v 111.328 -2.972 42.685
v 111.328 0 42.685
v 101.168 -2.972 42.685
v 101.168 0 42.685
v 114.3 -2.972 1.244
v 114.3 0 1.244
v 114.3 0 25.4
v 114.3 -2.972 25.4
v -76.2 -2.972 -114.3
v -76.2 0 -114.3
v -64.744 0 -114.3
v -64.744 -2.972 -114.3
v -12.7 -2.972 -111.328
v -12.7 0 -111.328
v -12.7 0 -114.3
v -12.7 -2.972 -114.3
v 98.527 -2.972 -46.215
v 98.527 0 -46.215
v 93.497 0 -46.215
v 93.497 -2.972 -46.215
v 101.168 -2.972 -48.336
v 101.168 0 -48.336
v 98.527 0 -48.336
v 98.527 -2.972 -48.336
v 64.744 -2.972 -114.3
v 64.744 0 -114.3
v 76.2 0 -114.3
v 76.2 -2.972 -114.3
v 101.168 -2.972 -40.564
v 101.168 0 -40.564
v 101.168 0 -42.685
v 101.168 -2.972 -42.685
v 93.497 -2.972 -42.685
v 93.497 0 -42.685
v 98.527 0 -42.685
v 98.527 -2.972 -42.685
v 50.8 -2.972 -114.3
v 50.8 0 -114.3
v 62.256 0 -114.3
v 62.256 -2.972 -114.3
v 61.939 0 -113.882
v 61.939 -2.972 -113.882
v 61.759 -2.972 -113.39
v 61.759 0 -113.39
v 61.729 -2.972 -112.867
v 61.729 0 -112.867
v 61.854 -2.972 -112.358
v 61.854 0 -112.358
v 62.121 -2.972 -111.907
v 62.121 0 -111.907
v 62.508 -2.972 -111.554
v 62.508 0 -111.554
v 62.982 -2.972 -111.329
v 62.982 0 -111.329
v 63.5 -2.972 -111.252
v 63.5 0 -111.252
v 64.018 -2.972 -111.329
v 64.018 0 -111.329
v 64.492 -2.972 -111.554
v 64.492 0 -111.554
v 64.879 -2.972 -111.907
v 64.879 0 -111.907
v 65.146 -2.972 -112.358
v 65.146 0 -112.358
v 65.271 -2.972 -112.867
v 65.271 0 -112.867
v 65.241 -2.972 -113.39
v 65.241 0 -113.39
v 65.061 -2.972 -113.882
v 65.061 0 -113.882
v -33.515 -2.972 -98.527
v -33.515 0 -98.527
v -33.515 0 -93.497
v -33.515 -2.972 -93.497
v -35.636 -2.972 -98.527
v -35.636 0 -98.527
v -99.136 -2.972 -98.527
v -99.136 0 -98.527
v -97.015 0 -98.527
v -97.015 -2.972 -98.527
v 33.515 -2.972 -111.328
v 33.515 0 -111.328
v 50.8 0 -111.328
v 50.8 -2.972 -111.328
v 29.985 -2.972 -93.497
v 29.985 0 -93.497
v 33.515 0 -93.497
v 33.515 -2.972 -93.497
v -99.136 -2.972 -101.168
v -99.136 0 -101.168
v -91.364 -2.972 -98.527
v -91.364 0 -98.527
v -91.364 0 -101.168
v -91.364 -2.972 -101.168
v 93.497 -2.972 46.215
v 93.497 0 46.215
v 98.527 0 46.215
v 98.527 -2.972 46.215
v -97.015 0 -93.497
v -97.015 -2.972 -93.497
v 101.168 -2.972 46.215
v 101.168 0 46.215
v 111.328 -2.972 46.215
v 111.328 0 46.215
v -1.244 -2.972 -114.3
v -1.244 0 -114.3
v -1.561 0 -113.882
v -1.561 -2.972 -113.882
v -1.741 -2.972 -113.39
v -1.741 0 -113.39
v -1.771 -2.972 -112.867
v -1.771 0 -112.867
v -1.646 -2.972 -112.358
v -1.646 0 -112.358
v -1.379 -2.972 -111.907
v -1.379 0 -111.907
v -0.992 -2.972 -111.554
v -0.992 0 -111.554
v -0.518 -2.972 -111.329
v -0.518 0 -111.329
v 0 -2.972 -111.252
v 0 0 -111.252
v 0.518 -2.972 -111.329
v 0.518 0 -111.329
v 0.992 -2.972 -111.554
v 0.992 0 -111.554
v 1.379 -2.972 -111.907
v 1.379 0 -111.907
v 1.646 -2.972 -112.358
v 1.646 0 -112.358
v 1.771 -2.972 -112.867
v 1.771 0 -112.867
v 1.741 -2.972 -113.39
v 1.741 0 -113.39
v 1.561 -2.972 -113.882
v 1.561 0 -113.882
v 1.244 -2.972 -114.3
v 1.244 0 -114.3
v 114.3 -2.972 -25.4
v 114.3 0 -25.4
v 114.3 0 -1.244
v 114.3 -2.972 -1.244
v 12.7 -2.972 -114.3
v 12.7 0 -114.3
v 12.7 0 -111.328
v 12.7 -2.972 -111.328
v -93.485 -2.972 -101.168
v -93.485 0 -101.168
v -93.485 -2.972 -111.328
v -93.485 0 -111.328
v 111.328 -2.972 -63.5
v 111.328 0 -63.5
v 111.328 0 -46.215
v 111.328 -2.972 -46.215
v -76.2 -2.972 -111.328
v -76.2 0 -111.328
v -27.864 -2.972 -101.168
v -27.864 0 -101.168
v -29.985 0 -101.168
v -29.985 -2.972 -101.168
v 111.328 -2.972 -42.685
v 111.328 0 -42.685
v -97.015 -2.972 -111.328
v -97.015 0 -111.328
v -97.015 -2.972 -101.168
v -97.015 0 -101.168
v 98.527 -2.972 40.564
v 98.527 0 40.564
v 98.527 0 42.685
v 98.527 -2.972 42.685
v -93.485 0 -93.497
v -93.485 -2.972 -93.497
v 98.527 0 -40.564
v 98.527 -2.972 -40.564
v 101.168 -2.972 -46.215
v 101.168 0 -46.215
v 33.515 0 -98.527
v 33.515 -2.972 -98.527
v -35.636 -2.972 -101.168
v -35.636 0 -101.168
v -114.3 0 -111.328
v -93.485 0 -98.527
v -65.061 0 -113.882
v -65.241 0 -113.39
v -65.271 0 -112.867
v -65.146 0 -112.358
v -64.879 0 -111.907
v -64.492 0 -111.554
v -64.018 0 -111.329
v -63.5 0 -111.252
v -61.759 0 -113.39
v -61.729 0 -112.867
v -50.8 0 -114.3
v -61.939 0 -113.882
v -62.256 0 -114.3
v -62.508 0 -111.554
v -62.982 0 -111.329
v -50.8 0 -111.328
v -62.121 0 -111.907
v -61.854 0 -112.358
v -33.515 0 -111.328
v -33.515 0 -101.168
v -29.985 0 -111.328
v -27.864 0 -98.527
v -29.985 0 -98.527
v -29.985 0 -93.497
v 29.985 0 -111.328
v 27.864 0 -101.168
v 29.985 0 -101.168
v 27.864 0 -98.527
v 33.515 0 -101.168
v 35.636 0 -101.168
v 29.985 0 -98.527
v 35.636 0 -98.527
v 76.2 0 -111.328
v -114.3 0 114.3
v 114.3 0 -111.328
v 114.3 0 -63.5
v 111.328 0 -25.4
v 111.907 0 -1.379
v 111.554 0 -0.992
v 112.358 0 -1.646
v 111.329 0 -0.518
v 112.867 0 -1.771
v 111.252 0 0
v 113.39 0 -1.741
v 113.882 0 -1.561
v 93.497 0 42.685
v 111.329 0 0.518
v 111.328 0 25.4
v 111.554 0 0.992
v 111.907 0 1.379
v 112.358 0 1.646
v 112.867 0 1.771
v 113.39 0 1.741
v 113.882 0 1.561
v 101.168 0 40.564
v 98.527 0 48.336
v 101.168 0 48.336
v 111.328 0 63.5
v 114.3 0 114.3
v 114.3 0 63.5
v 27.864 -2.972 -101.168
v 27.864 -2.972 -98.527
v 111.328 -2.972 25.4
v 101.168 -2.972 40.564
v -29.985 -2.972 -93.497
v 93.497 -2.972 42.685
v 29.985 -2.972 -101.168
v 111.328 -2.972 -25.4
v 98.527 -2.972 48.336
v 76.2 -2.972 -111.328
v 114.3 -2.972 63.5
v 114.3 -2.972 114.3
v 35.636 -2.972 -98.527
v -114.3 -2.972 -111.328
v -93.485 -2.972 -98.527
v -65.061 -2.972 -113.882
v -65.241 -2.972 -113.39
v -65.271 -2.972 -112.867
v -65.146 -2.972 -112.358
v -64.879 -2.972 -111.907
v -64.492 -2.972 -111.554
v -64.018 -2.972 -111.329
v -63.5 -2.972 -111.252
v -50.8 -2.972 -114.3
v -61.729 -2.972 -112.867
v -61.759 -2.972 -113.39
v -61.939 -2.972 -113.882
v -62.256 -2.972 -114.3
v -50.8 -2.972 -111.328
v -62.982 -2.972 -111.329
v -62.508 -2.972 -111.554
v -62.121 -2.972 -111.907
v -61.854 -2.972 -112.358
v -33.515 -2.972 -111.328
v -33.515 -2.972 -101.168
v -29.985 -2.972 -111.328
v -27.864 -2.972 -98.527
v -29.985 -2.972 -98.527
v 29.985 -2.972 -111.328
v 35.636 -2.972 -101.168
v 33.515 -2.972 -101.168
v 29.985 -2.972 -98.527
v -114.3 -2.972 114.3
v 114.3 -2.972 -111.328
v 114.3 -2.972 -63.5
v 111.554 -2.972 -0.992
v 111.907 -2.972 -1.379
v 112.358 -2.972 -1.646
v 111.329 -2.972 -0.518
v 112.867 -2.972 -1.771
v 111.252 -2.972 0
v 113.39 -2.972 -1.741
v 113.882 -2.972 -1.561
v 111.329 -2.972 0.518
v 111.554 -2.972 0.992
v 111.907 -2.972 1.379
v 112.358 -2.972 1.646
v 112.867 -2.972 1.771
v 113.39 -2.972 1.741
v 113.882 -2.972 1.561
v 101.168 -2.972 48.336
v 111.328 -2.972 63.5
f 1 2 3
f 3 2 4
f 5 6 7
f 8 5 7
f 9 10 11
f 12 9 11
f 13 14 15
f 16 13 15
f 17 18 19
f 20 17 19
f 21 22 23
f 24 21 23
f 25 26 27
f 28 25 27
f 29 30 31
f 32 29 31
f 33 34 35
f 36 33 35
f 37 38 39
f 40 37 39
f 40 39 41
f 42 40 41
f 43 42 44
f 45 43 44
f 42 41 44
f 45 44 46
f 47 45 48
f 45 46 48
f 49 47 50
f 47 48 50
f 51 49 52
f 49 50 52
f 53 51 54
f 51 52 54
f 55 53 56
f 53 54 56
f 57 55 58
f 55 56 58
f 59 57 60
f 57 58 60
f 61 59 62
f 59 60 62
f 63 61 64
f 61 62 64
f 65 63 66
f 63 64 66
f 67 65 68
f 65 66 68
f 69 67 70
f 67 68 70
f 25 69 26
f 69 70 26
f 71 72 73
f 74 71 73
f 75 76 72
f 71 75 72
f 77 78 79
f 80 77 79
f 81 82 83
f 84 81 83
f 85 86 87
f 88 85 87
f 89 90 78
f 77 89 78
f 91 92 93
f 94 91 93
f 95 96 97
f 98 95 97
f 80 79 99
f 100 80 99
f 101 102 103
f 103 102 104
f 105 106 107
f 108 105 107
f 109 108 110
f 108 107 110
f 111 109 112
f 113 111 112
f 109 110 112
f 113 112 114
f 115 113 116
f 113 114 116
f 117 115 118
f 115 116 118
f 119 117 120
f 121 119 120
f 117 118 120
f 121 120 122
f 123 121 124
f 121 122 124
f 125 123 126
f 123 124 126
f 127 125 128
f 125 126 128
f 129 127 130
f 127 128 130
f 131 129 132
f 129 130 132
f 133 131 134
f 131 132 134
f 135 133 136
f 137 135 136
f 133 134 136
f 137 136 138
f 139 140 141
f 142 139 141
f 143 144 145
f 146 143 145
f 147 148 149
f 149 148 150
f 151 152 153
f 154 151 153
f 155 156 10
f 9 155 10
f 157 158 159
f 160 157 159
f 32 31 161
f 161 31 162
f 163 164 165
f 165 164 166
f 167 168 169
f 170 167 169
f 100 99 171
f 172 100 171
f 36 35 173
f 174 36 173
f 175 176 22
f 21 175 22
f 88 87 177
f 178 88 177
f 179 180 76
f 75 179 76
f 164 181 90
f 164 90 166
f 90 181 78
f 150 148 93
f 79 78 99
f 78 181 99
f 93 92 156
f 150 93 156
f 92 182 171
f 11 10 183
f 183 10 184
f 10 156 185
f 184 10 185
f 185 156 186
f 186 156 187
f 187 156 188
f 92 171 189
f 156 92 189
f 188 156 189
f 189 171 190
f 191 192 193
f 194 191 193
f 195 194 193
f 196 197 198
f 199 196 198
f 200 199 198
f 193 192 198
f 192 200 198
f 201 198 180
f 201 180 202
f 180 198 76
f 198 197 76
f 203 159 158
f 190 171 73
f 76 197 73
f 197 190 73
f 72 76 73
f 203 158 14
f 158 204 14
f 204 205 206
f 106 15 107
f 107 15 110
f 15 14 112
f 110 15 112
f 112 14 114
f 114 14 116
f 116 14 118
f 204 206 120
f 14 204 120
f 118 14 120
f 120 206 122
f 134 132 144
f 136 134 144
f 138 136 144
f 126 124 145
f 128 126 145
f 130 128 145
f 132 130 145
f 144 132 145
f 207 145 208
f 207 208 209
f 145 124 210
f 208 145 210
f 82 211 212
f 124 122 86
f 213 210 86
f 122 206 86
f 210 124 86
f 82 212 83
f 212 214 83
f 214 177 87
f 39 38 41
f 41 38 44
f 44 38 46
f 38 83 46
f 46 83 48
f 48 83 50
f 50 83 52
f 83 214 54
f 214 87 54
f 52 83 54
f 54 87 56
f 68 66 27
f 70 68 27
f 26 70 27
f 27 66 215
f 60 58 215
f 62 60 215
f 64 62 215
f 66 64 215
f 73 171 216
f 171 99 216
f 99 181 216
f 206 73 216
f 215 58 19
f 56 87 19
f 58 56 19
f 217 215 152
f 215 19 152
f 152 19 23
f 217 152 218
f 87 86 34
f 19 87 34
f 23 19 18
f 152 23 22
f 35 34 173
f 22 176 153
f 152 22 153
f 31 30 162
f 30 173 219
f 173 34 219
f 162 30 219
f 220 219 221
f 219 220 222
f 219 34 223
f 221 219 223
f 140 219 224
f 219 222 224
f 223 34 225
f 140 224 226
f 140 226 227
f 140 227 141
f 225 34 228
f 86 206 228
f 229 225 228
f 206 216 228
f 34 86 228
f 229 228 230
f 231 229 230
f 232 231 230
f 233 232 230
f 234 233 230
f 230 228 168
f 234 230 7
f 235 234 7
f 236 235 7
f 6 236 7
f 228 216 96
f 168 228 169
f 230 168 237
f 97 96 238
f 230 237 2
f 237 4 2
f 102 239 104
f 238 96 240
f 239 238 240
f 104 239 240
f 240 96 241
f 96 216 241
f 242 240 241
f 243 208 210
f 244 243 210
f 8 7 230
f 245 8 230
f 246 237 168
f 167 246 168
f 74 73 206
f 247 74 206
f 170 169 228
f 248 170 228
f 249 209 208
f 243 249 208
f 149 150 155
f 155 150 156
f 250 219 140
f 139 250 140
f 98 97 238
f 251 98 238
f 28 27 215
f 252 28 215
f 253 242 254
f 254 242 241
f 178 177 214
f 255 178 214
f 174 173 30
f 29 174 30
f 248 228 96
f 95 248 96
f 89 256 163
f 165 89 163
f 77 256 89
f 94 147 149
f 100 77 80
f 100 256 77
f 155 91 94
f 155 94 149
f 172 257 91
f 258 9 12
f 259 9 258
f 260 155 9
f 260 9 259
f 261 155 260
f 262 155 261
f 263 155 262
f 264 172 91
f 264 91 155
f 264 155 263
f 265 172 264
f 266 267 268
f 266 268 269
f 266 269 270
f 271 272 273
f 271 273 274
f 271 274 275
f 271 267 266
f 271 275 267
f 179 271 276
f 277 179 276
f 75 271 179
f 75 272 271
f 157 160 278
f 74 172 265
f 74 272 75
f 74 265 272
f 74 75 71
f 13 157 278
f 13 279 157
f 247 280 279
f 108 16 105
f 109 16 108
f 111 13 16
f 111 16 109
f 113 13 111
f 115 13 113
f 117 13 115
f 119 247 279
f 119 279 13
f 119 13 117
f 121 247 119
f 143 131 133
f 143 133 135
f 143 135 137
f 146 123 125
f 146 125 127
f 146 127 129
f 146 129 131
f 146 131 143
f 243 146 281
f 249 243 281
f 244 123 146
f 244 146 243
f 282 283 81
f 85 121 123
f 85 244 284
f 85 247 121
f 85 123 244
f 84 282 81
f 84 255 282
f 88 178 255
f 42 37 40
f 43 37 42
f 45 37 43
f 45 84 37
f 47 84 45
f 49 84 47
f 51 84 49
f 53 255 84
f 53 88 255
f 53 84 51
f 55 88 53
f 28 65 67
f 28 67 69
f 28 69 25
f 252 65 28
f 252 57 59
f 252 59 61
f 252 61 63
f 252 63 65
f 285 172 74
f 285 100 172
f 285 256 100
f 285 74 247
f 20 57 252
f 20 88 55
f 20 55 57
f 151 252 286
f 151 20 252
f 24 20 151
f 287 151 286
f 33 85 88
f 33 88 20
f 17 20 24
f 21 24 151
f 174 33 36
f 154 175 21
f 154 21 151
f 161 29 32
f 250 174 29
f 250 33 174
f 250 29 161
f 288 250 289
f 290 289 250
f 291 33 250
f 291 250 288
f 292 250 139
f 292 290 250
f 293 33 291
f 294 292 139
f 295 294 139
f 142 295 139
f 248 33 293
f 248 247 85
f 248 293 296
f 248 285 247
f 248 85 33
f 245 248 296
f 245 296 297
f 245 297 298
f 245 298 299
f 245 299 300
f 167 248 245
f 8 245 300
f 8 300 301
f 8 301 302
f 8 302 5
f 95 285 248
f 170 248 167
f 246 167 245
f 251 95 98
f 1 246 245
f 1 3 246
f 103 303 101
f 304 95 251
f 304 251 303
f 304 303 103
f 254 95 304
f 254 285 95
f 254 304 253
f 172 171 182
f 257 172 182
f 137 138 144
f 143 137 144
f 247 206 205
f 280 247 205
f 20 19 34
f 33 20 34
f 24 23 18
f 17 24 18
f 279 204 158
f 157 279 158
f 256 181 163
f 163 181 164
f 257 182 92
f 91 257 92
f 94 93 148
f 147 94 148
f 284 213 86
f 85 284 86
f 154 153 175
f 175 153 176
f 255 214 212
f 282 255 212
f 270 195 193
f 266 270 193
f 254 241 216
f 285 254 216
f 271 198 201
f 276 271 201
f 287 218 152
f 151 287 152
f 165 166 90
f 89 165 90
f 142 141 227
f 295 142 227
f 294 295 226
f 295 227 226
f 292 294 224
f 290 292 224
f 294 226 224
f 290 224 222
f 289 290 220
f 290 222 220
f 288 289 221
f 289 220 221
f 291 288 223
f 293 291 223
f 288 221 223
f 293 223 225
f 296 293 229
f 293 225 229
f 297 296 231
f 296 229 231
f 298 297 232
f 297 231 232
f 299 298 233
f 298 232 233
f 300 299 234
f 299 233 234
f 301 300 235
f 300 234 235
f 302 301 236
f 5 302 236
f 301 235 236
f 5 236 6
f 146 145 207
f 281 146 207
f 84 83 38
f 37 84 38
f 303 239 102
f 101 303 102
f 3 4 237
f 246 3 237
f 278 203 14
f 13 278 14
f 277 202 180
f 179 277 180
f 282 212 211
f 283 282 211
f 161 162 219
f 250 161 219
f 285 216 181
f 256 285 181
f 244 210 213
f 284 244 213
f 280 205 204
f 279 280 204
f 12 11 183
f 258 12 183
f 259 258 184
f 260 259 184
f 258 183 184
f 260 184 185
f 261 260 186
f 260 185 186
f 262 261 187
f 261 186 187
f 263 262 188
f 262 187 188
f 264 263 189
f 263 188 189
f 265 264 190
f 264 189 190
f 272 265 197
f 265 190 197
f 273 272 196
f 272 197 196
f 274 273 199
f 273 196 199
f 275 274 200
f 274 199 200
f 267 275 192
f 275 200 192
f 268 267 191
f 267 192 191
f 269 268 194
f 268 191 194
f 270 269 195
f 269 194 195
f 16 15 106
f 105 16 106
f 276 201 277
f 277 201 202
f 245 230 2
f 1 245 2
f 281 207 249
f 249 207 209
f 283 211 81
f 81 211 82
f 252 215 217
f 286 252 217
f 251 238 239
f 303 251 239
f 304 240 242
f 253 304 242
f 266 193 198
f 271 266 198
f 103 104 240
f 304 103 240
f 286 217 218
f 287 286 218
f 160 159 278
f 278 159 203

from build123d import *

# Parameters (mm, degrees)
F1_DEPTH = 2.9718


with BuildPart() as f1:
    # F0 (on Front) → F1 (new body)
    with BuildSketch(Plane.XZ):
        with BuildLine():
            Line((64.744341, -114.3), (76.2, -114.3))
            Line((76.2, -114.3), (76.2, -111.3282))
            Line((76.2, -111.3282), (114.3, -111.3282))
            Line((114.3, -111.3282), (114.3, -63.5))
            Line((114.3, -63.5), (111.3282, -63.5))
            Line((111.3282, -63.5), (111.3282, -46.2153))
            Line((111.3282, -46.2153), (101.1682, -46.2153))
            Line((101.1682, -46.2153), (101.1682, -48.3362))
            Line((101.1682, -48.3362), (98.5266, -48.3362))
            Line((98.5266, -48.3362), (98.5266, -46.2153))
            Line((98.5266, -46.2153), (93.4974, -46.2153))
            Line((93.4974, -46.2153), (93.4974, -42.6847))
            Line((93.4974, -42.6847), (98.5266, -42.6847))
            Line((98.5266, -42.6847), (98.5266, -40.5638))
            Line((98.5266, -40.5638), (101.1682, -40.5638))
            Line((101.1682, -40.5638), (101.1682, -42.6847))
            Line((101.1682, -42.6847), (111.3282, -42.6847))
            Line((111.3282, -42.6847), (111.3282, -25.4))
            Line((111.3282, -25.4), (114.3, -25.4))
            Line((114.3, -25.4), (114.3, -1.244341))
            ThreePointArc((114.3, -1.244341), (111.252, 0), (114.3, 1.244341))
            Line((114.3, 1.244341), (114.3, 25.4))
            Line((114.3, 25.4), (111.3282, 25.4))
            Line((111.3282, 25.4), (111.3282, 42.6847))
            Line((111.3282, 42.6847), (101.1682, 42.6847))
            Line((101.1682, 42.6847), (101.1682, 40.5638))
            Line((101.1682, 40.5638), (98.5266, 40.5638))
            Line((98.5266, 40.5638), (98.5266, 42.6847))
            Line((98.5266, 42.6847), (93.4974, 42.6847))
            Line((93.4974, 42.6847), (93.4974, 46.2153))
            Line((93.4974, 46.2153), (98.5266, 46.2153))
            Line((98.5266, 46.2153), (98.5266, 48.3362))
            Line((98.5266, 48.3362), (101.1682, 48.3362))
            Line((101.1682, 48.3362), (101.1682, 46.2153))
            Line((101.1682, 46.2153), (111.3282, 46.2153))
            Line((111.3282, 46.2153), (111.3282, 63.5))
            Line((111.3282, 63.5), (114.3, 63.5))
            Line((114.3, 63.5), (114.3, 114.3))
            Line((114.3, 114.3), (-114.3, 114.3))
            Line((-114.3, 114.3), (-114.3, -111.3282))
            Line((-114.3, -111.3282), (-97.0153, -111.3282))
            Line((-97.0153, -111.3282), (-97.0153, -101.1682))
            Line((-97.0153, -101.1682), (-99.1362, -101.1682))
            Line((-99.1362, -101.1682), (-99.1362, -98.5266))
            Line((-99.1362, -98.5266), (-97.0153, -98.5266))
            Line((-97.0153, -98.5266), (-97.0153, -93.4974))
            Line((-97.0153, -93.4974), (-93.4847, -93.4974))
            Line((-93.4847, -93.4974), (-93.4847, -98.5266))
            Line((-93.4847, -98.5266), (-91.3638, -98.5266))
            Line((-91.3638, -98.5266), (-91.3638, -101.1682))
            Line((-91.3638, -101.1682), (-93.4847, -101.1682))
            Line((-93.4847, -101.1682), (-93.4847, -111.3282))
            Line((-93.4847, -111.3282), (-76.2, -111.3282))
            Line((-76.2, -111.3282), (-76.2, -114.3))
            Line((-76.2, -114.3), (-64.744341, -114.3))
            ThreePointArc((-64.744341, -114.3), (-63.5, -111.252), (-62.255659, -114.3))
            Line((-62.255659, -114.3), (-50.8, -114.3))
            Line((-50.8, -114.3), (-50.8, -111.3282))
            Line((-50.8, -111.3282), (-33.5153, -111.3282))
            Line((-33.5153, -111.3282), (-33.5153, -101.1682))
            Line((-33.5153, -101.1682), (-35.6362, -101.1682))
            Line((-35.6362, -101.1682), (-35.6362, -98.5266))
            Line((-35.6362, -98.5266), (-33.5153, -98.5266))
            Line((-33.5153, -98.5266), (-33.5153, -93.4974))
            Line((-33.5153, -93.4974), (-29.9847, -93.4974))
            Line((-29.9847, -93.4974), (-29.9847, -98.5266))
            Line((-29.9847, -98.5266), (-27.8638, -98.5266))
            Line((-27.8638, -98.5266), (-27.8638, -101.1682))
            Line((-27.8638, -101.1682), (-29.9847, -101.1682))
            Line((-29.9847, -101.1682), (-29.9847, -111.3282))
            Line((-29.9847, -111.3282), (-12.7, -111.3282))
            Line((-12.7, -111.3282), (-12.7, -114.3))
            Line((-12.7, -114.3), (-1.244341, -114.3))
            ThreePointArc((-1.244341, -114.3), (0, -111.252), (1.244341, -114.3))
            Line((1.244341, -114.3), (12.7, -114.3))
            Line((12.7, -114.3), (12.7, -111.3282))
            Line((12.7, -111.3282), (29.9847, -111.3282))
            Line((29.9847, -111.3282), (29.9847, -101.1682))
            Line((29.9847, -101.1682), (27.8638, -101.1682))
            Line((27.8638, -101.1682), (27.8638, -98.5266))
            Line((27.8638, -98.5266), (29.9847, -98.5266))
            Line((29.9847, -98.5266), (29.9847, -93.4974))
            Line((29.9847, -93.4974), (33.5153, -93.4974))
            Line((33.5153, -93.4974), (33.5153, -98.5266))
            Line((33.5153, -98.5266), (35.6362, -98.5266))
            Line((35.6362, -98.5266), (35.6362, -101.1682))
            Line((35.6362, -101.1682), (33.5153, -101.1682))
            Line((33.5153, -101.1682), (33.5153, -111.3282))
            Line((33.5153, -111.3282), (50.8, -111.3282))
            Line((50.8, -111.3282), (50.8, -114.3))
            Line((50.8, -114.3), (62.255659, -114.3))
            ThreePointArc((62.255659, -114.3), (63.5, -111.252), (64.744341, -114.3))
        make_face()
    extrude(amount=F1_DEPTH)


solid = f1.part
